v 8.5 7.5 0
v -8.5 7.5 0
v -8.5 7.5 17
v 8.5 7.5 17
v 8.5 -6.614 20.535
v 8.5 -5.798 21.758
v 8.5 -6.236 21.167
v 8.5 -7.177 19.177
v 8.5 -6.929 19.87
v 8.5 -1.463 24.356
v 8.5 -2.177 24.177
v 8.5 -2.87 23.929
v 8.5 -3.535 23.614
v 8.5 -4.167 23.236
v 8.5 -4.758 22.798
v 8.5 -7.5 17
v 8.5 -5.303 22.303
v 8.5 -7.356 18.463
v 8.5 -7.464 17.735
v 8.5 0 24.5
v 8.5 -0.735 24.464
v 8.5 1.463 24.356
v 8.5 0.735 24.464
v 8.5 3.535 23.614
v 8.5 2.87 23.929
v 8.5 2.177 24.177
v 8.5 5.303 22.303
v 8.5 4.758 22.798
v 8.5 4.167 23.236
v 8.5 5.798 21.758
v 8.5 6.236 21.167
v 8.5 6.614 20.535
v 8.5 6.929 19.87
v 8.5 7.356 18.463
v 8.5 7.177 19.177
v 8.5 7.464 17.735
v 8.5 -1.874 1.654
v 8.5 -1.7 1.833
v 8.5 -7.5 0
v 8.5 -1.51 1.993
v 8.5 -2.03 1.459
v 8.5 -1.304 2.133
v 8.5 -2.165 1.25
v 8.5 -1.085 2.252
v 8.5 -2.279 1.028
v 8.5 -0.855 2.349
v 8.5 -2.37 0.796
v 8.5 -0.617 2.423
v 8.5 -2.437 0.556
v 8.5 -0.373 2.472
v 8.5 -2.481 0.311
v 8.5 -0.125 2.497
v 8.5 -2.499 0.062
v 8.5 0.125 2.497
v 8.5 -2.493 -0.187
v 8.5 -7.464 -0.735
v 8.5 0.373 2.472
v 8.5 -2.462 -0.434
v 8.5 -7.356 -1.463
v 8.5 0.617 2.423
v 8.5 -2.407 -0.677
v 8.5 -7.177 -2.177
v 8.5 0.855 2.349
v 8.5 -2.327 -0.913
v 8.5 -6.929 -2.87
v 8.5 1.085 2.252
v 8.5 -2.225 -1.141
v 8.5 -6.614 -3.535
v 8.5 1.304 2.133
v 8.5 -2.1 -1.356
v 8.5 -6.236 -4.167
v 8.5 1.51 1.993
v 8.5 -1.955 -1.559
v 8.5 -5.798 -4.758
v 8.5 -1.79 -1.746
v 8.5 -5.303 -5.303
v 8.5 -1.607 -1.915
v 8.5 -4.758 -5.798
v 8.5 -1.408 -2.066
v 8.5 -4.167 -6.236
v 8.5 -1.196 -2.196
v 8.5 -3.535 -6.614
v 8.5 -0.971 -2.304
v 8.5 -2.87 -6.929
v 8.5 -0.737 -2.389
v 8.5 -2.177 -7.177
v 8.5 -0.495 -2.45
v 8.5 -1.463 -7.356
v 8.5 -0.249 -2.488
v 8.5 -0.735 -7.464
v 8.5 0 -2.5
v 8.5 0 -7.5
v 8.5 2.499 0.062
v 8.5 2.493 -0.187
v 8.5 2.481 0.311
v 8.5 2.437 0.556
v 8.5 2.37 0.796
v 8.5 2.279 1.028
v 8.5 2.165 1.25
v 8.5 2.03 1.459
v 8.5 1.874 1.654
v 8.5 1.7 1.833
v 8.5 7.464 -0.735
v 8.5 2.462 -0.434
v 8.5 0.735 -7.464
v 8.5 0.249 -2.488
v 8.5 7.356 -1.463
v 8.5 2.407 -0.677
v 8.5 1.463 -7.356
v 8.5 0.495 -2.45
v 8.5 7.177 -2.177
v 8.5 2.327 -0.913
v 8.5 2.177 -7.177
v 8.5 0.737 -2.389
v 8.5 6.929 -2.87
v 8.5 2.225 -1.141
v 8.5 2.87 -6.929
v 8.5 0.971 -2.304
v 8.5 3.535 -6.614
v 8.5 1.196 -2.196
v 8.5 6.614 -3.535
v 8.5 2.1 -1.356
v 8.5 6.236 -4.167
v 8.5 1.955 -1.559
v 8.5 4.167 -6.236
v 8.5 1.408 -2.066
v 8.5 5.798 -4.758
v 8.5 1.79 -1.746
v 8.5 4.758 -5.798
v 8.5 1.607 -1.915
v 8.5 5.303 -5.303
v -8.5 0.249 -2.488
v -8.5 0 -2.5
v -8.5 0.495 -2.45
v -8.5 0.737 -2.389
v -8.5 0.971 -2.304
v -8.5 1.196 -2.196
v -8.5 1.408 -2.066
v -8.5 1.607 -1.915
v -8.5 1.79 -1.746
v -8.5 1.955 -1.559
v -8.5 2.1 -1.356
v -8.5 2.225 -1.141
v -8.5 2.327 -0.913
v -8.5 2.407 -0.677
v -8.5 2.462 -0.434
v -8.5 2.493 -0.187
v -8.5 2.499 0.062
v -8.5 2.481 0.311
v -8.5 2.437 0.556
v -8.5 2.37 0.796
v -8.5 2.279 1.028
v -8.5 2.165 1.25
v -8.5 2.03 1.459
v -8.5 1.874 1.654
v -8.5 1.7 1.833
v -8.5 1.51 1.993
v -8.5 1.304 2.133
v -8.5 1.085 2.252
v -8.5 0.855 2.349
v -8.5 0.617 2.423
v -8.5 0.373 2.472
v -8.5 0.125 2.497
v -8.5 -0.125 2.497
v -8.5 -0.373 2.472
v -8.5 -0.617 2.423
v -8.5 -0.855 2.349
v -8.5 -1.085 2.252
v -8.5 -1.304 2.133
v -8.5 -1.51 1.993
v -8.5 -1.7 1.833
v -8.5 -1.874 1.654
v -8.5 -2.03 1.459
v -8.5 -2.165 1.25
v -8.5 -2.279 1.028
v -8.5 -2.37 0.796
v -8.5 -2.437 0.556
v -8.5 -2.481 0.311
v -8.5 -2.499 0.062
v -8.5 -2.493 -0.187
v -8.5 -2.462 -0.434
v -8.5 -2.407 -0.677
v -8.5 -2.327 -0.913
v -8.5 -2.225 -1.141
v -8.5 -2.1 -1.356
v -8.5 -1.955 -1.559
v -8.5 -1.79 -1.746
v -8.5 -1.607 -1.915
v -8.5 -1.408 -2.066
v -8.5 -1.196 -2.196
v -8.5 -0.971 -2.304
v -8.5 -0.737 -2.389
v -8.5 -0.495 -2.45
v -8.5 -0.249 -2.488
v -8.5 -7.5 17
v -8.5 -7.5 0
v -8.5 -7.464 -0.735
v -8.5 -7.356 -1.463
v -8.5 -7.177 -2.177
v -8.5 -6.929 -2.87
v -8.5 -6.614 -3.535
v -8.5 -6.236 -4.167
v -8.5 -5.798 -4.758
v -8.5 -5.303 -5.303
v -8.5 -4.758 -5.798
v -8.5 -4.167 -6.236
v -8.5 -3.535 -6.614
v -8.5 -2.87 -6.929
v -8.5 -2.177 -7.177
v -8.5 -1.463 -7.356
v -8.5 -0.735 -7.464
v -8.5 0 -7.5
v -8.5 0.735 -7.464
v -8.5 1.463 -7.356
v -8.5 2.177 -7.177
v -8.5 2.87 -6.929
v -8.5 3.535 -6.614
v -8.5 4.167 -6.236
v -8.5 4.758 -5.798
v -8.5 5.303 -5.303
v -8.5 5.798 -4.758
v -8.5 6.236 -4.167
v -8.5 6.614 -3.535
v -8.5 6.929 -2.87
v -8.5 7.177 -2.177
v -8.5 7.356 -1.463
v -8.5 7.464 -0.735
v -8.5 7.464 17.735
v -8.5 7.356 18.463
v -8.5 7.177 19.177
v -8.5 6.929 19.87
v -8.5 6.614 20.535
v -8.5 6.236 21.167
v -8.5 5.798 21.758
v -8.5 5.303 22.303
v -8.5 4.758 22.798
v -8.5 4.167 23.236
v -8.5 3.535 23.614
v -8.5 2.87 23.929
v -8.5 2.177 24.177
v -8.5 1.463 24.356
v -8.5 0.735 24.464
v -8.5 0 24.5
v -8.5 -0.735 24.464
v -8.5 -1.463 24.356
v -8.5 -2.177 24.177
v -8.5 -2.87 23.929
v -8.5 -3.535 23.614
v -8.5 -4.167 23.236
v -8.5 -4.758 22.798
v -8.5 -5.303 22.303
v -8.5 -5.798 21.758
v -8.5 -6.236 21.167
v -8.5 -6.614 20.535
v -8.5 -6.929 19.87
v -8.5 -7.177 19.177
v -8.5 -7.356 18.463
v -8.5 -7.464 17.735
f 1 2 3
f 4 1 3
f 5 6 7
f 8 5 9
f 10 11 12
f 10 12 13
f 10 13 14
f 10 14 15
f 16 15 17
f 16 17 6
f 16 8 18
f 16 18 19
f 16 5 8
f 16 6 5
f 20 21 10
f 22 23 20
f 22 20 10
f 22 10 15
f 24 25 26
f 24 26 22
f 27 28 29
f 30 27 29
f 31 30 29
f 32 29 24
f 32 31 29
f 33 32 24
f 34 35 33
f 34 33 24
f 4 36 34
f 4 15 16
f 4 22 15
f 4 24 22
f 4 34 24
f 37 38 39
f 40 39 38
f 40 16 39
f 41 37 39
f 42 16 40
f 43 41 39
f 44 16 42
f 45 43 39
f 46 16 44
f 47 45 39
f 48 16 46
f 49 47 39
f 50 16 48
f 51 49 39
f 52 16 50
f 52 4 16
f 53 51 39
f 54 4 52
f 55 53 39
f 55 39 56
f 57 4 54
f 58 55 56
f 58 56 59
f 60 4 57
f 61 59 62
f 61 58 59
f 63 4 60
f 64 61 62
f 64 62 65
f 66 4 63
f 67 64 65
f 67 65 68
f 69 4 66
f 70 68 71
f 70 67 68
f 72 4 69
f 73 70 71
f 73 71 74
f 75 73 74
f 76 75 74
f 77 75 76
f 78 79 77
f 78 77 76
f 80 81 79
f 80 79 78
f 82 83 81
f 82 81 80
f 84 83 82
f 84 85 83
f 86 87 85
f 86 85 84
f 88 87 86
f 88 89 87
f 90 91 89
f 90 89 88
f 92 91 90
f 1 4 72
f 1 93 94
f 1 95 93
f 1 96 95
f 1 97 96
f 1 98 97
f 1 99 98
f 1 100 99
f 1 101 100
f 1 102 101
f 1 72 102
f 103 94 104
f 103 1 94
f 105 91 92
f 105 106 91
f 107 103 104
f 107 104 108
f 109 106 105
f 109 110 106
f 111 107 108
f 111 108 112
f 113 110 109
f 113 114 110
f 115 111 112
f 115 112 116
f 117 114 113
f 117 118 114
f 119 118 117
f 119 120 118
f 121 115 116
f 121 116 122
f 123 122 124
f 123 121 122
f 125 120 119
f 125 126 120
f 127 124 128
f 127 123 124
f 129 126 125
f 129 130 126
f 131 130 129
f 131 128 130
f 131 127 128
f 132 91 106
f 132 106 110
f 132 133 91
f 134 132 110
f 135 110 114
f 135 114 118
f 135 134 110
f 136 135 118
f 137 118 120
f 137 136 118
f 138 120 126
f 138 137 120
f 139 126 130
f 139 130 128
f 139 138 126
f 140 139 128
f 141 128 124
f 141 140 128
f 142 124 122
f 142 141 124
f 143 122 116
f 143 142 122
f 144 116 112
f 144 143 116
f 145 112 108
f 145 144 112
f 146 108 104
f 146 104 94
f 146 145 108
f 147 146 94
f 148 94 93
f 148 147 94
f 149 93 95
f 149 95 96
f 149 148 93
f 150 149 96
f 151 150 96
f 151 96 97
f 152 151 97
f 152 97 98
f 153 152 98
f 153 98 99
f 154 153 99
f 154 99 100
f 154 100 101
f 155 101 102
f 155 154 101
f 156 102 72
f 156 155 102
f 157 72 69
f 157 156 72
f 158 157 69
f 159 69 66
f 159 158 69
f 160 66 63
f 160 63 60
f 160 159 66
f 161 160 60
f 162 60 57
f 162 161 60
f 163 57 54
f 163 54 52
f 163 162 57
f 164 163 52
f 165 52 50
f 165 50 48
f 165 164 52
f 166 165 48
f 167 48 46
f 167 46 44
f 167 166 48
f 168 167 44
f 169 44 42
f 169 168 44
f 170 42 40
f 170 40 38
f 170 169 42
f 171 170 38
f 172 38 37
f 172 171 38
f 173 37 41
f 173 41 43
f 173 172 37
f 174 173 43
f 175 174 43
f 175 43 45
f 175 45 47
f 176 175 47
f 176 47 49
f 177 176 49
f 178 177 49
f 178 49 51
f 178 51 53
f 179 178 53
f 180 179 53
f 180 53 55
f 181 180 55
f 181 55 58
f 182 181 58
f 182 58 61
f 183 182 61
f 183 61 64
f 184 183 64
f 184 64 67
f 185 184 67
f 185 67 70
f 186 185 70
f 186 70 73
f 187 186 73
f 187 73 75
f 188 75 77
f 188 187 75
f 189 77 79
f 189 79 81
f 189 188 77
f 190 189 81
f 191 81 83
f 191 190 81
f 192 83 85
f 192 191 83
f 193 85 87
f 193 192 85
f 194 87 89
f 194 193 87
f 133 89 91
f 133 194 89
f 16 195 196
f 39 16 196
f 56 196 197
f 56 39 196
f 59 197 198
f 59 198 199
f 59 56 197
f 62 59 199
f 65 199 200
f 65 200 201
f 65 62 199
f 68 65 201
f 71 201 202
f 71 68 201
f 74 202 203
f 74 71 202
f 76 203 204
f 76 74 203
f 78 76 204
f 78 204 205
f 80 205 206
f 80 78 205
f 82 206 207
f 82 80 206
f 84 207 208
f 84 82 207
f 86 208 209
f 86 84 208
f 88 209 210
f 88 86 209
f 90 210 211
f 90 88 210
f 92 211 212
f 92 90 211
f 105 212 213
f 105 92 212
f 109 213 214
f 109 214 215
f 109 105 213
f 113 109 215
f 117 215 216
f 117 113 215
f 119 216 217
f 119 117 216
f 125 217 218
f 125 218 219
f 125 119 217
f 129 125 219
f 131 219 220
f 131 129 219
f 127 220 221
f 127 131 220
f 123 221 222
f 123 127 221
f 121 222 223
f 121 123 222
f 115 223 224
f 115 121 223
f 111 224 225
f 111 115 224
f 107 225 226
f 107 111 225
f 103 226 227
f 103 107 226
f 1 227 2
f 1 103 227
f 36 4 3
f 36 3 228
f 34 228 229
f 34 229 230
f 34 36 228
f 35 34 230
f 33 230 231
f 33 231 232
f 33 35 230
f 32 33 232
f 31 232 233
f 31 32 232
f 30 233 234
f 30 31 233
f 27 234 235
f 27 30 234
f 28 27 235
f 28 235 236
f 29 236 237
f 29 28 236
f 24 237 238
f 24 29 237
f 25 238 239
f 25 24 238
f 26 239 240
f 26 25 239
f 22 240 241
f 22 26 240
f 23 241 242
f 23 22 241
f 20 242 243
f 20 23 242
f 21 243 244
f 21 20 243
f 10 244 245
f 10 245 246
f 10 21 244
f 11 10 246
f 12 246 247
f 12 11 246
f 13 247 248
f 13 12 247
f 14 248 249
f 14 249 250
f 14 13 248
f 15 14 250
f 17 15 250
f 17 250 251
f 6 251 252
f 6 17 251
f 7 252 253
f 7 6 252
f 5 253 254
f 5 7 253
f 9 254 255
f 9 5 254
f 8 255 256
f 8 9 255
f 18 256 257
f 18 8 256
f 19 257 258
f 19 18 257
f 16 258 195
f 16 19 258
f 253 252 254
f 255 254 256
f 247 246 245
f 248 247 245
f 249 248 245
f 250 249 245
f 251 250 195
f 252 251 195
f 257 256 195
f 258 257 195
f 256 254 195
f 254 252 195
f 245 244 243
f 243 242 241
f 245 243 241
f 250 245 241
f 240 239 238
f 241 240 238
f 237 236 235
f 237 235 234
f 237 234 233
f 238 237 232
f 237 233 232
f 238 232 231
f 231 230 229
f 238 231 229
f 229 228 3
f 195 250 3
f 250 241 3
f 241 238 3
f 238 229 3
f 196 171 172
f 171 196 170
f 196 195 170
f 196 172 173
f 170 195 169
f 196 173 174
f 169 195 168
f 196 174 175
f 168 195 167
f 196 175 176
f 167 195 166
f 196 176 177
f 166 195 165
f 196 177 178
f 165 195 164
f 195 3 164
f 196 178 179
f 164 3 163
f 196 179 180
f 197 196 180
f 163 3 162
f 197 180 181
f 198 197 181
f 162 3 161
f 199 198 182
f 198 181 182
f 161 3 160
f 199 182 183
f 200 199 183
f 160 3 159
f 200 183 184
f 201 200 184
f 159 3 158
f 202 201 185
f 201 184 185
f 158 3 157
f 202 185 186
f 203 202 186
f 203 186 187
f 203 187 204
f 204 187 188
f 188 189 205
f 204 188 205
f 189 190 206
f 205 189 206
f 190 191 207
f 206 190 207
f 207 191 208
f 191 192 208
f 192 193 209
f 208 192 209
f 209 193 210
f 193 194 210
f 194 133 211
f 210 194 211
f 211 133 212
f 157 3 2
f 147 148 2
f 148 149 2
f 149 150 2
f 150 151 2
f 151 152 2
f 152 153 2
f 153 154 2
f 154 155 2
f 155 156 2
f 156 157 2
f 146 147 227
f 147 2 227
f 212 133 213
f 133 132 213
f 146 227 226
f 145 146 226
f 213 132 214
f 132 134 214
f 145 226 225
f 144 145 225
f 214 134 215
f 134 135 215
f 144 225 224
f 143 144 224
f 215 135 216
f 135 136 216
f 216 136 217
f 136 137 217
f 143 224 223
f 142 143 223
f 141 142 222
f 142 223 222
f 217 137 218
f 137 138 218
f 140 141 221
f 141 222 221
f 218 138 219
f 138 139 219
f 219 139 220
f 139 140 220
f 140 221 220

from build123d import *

# Parameters (mm, degrees)
CROQUIS1_R              = 2.5
SALIENTE_EXTRUIR1_DEPTH = 8.5


with BuildPart() as part:
    # Croquis1 → Saliente-Extruir1 (new, symmetric)
    with BuildSketch(Plane(origin=(0, 0, 0), x_dir=(0, 0, -1), z_dir=(1, 0, 0))):
        with BuildLine():
            Line((0, 7.5), (-17, 7.5))
            ThreePointArc((-17, 7.5), (-24.5, 0), (-17, -7.5))
            Line((-17, -7.5), (0, -7.5))
            ThreePointArc((0, -7.5), (7.5, 0), (0, 7.5))
        make_face()
        Circle(CROQUIS1_R, mode=Mode.SUBTRACT)
    extrude(amount=SALIENTE_EXTRUIR1_DEPTH, both=True)


solid = part.part
